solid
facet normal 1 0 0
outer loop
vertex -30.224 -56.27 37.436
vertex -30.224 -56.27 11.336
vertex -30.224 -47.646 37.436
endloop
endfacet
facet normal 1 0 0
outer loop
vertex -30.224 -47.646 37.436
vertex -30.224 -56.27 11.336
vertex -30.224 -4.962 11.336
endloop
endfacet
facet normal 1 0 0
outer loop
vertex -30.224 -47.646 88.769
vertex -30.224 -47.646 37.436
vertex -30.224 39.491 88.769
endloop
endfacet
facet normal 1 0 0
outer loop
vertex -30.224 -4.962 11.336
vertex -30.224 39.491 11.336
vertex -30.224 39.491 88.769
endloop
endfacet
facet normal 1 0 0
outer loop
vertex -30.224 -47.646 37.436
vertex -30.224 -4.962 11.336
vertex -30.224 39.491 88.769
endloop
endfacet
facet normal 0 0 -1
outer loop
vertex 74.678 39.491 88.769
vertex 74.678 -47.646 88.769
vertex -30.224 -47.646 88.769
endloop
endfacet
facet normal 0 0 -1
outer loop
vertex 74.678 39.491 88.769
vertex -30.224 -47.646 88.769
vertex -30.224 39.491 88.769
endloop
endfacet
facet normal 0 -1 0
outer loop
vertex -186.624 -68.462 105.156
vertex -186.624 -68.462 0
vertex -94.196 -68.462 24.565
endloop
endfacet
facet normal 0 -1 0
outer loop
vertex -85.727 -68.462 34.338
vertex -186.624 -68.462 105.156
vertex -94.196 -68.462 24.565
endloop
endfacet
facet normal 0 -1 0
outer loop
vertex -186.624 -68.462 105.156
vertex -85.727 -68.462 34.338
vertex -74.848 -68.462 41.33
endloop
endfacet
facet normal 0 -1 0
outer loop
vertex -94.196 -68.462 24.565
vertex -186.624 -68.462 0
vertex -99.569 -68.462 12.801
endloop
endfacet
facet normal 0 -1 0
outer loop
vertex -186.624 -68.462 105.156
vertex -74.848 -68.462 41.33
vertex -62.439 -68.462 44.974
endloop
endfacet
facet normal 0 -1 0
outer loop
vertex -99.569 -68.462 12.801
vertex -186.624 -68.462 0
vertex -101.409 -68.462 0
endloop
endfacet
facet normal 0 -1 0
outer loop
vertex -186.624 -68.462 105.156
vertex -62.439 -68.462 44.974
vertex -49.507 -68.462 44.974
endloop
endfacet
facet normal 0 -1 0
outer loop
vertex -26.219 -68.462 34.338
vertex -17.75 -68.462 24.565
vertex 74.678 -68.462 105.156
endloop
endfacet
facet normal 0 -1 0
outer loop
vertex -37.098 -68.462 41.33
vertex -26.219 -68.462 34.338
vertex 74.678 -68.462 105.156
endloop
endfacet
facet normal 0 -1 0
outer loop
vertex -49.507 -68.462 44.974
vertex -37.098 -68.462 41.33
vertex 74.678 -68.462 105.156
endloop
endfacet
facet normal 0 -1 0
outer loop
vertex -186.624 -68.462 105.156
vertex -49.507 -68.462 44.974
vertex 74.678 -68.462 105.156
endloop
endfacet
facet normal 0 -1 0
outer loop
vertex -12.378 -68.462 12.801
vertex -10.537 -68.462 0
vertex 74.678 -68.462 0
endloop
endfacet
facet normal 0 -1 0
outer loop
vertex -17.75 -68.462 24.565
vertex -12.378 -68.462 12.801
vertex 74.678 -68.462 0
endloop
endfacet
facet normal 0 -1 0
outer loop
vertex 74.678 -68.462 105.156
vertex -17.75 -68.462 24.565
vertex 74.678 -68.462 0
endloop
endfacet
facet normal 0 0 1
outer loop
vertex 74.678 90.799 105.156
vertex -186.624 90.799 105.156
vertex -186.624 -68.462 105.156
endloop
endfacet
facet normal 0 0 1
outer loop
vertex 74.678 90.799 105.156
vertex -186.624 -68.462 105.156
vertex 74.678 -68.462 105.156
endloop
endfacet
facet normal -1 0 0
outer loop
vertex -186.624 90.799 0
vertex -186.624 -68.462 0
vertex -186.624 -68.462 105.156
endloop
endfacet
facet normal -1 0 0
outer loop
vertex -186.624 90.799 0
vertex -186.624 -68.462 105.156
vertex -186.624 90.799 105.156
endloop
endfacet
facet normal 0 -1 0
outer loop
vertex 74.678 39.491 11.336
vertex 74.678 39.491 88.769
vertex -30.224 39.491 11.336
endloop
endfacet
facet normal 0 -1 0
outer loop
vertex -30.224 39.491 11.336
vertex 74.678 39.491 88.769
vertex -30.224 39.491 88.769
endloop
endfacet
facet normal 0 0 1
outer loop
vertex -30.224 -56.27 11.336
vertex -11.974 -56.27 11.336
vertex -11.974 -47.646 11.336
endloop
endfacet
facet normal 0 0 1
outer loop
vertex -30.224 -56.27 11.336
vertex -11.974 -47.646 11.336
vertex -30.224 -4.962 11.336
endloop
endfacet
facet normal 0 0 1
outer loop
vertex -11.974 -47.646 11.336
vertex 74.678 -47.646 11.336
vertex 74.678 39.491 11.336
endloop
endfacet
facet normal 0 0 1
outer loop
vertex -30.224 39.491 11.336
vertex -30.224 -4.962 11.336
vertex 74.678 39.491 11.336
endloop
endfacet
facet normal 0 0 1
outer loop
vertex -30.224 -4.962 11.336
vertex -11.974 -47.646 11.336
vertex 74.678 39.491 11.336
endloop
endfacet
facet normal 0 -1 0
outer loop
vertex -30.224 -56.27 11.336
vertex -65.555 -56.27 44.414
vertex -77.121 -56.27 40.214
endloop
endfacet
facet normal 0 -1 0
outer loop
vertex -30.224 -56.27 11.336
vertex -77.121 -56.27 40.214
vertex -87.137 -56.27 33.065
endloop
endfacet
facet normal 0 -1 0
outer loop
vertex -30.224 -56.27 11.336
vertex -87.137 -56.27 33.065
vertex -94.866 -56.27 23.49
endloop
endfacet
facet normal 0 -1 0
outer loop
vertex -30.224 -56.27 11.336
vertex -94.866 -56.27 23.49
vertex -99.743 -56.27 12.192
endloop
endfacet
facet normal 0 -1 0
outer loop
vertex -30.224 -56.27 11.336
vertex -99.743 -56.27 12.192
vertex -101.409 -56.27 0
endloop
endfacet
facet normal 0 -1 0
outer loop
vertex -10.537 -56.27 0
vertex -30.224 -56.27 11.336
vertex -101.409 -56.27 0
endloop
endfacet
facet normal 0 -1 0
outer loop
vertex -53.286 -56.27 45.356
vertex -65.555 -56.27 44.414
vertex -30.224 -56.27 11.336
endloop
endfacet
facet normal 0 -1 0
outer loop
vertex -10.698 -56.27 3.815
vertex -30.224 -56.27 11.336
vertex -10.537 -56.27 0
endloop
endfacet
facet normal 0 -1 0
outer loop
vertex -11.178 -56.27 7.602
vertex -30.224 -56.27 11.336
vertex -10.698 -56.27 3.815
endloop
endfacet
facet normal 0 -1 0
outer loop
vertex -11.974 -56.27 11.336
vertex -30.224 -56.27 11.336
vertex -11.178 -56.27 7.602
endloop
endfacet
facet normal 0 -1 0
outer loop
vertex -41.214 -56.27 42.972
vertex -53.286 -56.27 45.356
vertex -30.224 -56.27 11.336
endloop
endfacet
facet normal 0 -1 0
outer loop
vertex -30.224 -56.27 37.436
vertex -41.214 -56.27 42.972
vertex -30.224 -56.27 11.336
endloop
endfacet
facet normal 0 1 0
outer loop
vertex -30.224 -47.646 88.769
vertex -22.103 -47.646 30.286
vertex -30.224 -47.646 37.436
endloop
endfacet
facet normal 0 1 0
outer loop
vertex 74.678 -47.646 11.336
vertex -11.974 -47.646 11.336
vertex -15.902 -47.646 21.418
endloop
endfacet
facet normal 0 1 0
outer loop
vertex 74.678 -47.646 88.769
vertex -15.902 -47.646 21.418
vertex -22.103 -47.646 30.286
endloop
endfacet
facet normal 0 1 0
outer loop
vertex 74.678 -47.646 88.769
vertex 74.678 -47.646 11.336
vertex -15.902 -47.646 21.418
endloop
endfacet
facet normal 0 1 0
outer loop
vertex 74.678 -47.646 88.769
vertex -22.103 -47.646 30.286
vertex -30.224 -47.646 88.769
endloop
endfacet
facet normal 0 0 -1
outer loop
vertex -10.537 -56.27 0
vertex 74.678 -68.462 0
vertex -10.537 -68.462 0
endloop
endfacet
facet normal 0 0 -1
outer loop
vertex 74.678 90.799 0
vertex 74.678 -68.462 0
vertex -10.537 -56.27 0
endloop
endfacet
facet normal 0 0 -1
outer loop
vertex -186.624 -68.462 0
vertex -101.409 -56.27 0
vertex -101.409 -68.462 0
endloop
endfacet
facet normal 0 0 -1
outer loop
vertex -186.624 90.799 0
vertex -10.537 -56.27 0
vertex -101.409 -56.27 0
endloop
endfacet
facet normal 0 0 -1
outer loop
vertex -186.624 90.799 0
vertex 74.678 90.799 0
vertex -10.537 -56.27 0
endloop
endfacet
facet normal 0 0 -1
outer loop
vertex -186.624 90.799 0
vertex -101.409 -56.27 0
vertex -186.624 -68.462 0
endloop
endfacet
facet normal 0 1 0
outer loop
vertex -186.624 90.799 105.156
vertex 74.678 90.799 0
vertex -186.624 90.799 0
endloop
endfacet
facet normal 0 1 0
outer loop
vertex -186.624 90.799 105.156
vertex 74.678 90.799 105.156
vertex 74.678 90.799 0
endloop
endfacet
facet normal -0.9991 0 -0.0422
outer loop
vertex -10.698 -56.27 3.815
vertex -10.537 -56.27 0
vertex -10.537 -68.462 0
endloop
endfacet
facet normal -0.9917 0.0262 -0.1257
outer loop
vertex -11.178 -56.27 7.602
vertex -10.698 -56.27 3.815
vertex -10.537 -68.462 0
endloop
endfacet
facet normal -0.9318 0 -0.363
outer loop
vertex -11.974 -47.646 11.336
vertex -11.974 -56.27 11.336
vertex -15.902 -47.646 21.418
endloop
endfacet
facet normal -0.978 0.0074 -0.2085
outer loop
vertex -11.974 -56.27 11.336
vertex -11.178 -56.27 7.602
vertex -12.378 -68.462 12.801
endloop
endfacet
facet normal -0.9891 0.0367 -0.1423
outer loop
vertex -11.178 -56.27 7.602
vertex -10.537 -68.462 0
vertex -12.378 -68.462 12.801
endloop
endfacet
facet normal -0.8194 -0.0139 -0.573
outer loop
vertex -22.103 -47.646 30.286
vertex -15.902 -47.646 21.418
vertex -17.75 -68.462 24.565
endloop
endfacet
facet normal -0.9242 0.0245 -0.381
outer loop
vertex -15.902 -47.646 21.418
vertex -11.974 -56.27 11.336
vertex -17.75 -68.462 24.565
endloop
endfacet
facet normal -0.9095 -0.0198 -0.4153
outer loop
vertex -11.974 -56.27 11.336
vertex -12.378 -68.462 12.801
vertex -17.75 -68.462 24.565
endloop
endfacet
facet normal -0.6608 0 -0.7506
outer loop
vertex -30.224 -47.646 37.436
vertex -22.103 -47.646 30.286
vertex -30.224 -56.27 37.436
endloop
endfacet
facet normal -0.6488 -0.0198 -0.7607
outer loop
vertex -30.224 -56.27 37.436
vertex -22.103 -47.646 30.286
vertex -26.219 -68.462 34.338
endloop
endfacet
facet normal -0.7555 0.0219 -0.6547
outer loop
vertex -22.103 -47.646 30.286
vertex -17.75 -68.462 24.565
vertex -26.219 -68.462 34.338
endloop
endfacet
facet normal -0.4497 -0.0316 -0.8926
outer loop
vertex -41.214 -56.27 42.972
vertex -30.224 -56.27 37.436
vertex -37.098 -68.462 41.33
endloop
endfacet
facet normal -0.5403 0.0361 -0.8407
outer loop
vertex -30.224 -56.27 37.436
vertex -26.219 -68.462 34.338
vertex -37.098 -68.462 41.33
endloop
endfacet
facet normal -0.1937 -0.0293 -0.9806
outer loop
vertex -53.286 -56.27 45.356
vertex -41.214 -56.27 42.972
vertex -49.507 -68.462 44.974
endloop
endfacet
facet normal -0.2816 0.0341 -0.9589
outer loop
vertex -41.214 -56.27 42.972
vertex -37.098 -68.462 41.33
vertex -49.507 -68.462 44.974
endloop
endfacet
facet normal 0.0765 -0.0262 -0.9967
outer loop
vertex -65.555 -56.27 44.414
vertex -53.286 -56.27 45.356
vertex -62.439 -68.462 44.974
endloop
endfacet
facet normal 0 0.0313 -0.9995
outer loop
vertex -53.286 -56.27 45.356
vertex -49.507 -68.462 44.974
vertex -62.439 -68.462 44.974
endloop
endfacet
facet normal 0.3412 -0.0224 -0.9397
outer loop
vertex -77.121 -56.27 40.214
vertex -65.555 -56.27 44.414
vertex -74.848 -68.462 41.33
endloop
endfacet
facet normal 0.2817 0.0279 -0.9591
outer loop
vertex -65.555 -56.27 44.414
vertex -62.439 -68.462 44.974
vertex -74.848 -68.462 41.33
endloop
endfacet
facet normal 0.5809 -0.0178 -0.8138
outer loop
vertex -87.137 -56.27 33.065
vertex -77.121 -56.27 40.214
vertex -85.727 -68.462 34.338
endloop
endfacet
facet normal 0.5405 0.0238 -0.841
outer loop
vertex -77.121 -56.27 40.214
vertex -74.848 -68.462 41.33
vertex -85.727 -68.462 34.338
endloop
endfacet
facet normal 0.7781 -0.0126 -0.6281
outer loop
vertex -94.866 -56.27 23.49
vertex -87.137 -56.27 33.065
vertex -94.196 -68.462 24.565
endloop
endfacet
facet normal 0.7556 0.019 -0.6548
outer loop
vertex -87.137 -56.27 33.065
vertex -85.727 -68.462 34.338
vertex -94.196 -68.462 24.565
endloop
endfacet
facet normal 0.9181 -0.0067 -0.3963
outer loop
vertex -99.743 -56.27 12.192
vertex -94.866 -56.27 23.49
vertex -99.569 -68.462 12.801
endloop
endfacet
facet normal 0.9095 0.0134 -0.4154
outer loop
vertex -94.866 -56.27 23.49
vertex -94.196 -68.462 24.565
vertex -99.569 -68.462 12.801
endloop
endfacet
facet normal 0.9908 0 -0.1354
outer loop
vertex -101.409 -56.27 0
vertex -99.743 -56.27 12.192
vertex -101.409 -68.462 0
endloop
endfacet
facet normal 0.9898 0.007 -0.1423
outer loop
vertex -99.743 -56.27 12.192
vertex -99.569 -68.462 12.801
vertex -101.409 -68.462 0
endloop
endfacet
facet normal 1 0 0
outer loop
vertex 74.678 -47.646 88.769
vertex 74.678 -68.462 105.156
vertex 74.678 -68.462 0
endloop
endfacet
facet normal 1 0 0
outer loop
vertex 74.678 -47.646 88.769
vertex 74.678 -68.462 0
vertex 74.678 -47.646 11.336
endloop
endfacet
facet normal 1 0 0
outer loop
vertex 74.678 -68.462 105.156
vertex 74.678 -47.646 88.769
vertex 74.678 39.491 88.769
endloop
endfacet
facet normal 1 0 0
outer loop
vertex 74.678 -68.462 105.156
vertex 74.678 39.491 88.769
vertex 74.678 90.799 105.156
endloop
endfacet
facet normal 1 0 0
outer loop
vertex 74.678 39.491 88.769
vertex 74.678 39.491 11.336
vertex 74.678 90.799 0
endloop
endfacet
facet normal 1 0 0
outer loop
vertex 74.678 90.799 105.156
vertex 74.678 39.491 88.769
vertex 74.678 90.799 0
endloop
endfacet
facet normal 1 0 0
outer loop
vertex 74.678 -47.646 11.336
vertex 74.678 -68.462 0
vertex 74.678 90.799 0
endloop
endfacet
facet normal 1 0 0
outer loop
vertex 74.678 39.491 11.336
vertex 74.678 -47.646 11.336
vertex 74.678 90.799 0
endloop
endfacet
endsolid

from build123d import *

# Parameters (mm, degrees)
F0_W       = 261.3020315766
F0_H       = 159.2612788081
F1_DEPTH   = 105.156
F2_W       = 119.9641153216
F2_H       = 77.4333942682
F3_DEPTH   = 104.902
F5_DEPTH   = 63.5
F1_FACE2_W = 261.3020315766
F1_FACE2_H = 105.156
F7_DEPTH   = 51.308


with BuildPart() as f1:
    # F0 (on Top) → F1 (new body)
    with BuildSketch(Plane.XY):
        with Locations((-55.9731982648, 11.1682154238)):
            Rectangle(F0_W, F0_H)
    extrude(amount=F1_DEPTH)

    # F2 (on face) → F3 (cut)
    with BuildSketch(Plane.YZ.offset(74.6778175235)):
        with Locations((12.3364068568, 50.0526567921)):
            Rectangle(F2_W, F2_H)
    extrude(amount=-F3_DEPTH, mode=Mode.SUBTRACT)

    # F4 (on face) → F5 (cut)
    with BuildSketch(Plane.XZ.offset(68.4624239802)):
        with BuildLine():
            Line((-101.4091865089, 0), (-10.5372100208, 0))
            ThreePointArc((-10.5372100208, 0), (-55.9731982648, 45.435988244), (-101.4091865089, 0))
        make_face()
    extrude(amount=-F5_DEPTH, mode=Mode.SUBTRACT)

    # F6 (on face) + F1_face2 (on face) + F5_face (on face) → F7 (join)
    with BuildSketch(Plane(origin=(0, 90.7988548279, 0), x_dir=(-1, 0, 0), z_dir=(0, 1, 0))):
        with BuildLine():
            Line((4.3711580431, 0), (100.9396470988, 0))
            ThreePointArc((100.9396470988, 0), (52.655402571, 48.2842445279), (4.3711580431, 0))
        make_face()
    with BuildSketch(Plane(origin=(-55.9731982648, 90.7988548279, 52.578), x_dir=(-1, 0, 0), z_dir=(0, 1, 0))):
        Rectangle(F1_FACE2_W, F1_FACE2_H)
    with BuildSketch(Plane(origin=(-59.2987118698, -4.9624239802, 19.1021444838), x_dir=(1, 0, 0), z_dir=(0, -1, 0))):
        with BuildLine():
            ThreePointArc((29.0745293932, 18.3333629075), (-17.8227374937, 21.1120383773), (-42.1104746391, -19.1021444838))
            Line((-42.1104746391, -19.1021444838), (48.761501849, -19.1021444838))
            ThreePointArc((48.761501849, -19.1021444838), (48.4008605817, -13.388815976), (47.3246618506, -7.7661848257))
            Line((47.3246618506, -7.7661848257), (29.0745293932, -7.7661848257))
            Line((29.0745293932, -7.7661848257), (29.0745293932, 18.3333629075))
        make_face()
    extrude(amount=-F7_DEPTH, dir=(0, 1, 0))


solid = f1.part
